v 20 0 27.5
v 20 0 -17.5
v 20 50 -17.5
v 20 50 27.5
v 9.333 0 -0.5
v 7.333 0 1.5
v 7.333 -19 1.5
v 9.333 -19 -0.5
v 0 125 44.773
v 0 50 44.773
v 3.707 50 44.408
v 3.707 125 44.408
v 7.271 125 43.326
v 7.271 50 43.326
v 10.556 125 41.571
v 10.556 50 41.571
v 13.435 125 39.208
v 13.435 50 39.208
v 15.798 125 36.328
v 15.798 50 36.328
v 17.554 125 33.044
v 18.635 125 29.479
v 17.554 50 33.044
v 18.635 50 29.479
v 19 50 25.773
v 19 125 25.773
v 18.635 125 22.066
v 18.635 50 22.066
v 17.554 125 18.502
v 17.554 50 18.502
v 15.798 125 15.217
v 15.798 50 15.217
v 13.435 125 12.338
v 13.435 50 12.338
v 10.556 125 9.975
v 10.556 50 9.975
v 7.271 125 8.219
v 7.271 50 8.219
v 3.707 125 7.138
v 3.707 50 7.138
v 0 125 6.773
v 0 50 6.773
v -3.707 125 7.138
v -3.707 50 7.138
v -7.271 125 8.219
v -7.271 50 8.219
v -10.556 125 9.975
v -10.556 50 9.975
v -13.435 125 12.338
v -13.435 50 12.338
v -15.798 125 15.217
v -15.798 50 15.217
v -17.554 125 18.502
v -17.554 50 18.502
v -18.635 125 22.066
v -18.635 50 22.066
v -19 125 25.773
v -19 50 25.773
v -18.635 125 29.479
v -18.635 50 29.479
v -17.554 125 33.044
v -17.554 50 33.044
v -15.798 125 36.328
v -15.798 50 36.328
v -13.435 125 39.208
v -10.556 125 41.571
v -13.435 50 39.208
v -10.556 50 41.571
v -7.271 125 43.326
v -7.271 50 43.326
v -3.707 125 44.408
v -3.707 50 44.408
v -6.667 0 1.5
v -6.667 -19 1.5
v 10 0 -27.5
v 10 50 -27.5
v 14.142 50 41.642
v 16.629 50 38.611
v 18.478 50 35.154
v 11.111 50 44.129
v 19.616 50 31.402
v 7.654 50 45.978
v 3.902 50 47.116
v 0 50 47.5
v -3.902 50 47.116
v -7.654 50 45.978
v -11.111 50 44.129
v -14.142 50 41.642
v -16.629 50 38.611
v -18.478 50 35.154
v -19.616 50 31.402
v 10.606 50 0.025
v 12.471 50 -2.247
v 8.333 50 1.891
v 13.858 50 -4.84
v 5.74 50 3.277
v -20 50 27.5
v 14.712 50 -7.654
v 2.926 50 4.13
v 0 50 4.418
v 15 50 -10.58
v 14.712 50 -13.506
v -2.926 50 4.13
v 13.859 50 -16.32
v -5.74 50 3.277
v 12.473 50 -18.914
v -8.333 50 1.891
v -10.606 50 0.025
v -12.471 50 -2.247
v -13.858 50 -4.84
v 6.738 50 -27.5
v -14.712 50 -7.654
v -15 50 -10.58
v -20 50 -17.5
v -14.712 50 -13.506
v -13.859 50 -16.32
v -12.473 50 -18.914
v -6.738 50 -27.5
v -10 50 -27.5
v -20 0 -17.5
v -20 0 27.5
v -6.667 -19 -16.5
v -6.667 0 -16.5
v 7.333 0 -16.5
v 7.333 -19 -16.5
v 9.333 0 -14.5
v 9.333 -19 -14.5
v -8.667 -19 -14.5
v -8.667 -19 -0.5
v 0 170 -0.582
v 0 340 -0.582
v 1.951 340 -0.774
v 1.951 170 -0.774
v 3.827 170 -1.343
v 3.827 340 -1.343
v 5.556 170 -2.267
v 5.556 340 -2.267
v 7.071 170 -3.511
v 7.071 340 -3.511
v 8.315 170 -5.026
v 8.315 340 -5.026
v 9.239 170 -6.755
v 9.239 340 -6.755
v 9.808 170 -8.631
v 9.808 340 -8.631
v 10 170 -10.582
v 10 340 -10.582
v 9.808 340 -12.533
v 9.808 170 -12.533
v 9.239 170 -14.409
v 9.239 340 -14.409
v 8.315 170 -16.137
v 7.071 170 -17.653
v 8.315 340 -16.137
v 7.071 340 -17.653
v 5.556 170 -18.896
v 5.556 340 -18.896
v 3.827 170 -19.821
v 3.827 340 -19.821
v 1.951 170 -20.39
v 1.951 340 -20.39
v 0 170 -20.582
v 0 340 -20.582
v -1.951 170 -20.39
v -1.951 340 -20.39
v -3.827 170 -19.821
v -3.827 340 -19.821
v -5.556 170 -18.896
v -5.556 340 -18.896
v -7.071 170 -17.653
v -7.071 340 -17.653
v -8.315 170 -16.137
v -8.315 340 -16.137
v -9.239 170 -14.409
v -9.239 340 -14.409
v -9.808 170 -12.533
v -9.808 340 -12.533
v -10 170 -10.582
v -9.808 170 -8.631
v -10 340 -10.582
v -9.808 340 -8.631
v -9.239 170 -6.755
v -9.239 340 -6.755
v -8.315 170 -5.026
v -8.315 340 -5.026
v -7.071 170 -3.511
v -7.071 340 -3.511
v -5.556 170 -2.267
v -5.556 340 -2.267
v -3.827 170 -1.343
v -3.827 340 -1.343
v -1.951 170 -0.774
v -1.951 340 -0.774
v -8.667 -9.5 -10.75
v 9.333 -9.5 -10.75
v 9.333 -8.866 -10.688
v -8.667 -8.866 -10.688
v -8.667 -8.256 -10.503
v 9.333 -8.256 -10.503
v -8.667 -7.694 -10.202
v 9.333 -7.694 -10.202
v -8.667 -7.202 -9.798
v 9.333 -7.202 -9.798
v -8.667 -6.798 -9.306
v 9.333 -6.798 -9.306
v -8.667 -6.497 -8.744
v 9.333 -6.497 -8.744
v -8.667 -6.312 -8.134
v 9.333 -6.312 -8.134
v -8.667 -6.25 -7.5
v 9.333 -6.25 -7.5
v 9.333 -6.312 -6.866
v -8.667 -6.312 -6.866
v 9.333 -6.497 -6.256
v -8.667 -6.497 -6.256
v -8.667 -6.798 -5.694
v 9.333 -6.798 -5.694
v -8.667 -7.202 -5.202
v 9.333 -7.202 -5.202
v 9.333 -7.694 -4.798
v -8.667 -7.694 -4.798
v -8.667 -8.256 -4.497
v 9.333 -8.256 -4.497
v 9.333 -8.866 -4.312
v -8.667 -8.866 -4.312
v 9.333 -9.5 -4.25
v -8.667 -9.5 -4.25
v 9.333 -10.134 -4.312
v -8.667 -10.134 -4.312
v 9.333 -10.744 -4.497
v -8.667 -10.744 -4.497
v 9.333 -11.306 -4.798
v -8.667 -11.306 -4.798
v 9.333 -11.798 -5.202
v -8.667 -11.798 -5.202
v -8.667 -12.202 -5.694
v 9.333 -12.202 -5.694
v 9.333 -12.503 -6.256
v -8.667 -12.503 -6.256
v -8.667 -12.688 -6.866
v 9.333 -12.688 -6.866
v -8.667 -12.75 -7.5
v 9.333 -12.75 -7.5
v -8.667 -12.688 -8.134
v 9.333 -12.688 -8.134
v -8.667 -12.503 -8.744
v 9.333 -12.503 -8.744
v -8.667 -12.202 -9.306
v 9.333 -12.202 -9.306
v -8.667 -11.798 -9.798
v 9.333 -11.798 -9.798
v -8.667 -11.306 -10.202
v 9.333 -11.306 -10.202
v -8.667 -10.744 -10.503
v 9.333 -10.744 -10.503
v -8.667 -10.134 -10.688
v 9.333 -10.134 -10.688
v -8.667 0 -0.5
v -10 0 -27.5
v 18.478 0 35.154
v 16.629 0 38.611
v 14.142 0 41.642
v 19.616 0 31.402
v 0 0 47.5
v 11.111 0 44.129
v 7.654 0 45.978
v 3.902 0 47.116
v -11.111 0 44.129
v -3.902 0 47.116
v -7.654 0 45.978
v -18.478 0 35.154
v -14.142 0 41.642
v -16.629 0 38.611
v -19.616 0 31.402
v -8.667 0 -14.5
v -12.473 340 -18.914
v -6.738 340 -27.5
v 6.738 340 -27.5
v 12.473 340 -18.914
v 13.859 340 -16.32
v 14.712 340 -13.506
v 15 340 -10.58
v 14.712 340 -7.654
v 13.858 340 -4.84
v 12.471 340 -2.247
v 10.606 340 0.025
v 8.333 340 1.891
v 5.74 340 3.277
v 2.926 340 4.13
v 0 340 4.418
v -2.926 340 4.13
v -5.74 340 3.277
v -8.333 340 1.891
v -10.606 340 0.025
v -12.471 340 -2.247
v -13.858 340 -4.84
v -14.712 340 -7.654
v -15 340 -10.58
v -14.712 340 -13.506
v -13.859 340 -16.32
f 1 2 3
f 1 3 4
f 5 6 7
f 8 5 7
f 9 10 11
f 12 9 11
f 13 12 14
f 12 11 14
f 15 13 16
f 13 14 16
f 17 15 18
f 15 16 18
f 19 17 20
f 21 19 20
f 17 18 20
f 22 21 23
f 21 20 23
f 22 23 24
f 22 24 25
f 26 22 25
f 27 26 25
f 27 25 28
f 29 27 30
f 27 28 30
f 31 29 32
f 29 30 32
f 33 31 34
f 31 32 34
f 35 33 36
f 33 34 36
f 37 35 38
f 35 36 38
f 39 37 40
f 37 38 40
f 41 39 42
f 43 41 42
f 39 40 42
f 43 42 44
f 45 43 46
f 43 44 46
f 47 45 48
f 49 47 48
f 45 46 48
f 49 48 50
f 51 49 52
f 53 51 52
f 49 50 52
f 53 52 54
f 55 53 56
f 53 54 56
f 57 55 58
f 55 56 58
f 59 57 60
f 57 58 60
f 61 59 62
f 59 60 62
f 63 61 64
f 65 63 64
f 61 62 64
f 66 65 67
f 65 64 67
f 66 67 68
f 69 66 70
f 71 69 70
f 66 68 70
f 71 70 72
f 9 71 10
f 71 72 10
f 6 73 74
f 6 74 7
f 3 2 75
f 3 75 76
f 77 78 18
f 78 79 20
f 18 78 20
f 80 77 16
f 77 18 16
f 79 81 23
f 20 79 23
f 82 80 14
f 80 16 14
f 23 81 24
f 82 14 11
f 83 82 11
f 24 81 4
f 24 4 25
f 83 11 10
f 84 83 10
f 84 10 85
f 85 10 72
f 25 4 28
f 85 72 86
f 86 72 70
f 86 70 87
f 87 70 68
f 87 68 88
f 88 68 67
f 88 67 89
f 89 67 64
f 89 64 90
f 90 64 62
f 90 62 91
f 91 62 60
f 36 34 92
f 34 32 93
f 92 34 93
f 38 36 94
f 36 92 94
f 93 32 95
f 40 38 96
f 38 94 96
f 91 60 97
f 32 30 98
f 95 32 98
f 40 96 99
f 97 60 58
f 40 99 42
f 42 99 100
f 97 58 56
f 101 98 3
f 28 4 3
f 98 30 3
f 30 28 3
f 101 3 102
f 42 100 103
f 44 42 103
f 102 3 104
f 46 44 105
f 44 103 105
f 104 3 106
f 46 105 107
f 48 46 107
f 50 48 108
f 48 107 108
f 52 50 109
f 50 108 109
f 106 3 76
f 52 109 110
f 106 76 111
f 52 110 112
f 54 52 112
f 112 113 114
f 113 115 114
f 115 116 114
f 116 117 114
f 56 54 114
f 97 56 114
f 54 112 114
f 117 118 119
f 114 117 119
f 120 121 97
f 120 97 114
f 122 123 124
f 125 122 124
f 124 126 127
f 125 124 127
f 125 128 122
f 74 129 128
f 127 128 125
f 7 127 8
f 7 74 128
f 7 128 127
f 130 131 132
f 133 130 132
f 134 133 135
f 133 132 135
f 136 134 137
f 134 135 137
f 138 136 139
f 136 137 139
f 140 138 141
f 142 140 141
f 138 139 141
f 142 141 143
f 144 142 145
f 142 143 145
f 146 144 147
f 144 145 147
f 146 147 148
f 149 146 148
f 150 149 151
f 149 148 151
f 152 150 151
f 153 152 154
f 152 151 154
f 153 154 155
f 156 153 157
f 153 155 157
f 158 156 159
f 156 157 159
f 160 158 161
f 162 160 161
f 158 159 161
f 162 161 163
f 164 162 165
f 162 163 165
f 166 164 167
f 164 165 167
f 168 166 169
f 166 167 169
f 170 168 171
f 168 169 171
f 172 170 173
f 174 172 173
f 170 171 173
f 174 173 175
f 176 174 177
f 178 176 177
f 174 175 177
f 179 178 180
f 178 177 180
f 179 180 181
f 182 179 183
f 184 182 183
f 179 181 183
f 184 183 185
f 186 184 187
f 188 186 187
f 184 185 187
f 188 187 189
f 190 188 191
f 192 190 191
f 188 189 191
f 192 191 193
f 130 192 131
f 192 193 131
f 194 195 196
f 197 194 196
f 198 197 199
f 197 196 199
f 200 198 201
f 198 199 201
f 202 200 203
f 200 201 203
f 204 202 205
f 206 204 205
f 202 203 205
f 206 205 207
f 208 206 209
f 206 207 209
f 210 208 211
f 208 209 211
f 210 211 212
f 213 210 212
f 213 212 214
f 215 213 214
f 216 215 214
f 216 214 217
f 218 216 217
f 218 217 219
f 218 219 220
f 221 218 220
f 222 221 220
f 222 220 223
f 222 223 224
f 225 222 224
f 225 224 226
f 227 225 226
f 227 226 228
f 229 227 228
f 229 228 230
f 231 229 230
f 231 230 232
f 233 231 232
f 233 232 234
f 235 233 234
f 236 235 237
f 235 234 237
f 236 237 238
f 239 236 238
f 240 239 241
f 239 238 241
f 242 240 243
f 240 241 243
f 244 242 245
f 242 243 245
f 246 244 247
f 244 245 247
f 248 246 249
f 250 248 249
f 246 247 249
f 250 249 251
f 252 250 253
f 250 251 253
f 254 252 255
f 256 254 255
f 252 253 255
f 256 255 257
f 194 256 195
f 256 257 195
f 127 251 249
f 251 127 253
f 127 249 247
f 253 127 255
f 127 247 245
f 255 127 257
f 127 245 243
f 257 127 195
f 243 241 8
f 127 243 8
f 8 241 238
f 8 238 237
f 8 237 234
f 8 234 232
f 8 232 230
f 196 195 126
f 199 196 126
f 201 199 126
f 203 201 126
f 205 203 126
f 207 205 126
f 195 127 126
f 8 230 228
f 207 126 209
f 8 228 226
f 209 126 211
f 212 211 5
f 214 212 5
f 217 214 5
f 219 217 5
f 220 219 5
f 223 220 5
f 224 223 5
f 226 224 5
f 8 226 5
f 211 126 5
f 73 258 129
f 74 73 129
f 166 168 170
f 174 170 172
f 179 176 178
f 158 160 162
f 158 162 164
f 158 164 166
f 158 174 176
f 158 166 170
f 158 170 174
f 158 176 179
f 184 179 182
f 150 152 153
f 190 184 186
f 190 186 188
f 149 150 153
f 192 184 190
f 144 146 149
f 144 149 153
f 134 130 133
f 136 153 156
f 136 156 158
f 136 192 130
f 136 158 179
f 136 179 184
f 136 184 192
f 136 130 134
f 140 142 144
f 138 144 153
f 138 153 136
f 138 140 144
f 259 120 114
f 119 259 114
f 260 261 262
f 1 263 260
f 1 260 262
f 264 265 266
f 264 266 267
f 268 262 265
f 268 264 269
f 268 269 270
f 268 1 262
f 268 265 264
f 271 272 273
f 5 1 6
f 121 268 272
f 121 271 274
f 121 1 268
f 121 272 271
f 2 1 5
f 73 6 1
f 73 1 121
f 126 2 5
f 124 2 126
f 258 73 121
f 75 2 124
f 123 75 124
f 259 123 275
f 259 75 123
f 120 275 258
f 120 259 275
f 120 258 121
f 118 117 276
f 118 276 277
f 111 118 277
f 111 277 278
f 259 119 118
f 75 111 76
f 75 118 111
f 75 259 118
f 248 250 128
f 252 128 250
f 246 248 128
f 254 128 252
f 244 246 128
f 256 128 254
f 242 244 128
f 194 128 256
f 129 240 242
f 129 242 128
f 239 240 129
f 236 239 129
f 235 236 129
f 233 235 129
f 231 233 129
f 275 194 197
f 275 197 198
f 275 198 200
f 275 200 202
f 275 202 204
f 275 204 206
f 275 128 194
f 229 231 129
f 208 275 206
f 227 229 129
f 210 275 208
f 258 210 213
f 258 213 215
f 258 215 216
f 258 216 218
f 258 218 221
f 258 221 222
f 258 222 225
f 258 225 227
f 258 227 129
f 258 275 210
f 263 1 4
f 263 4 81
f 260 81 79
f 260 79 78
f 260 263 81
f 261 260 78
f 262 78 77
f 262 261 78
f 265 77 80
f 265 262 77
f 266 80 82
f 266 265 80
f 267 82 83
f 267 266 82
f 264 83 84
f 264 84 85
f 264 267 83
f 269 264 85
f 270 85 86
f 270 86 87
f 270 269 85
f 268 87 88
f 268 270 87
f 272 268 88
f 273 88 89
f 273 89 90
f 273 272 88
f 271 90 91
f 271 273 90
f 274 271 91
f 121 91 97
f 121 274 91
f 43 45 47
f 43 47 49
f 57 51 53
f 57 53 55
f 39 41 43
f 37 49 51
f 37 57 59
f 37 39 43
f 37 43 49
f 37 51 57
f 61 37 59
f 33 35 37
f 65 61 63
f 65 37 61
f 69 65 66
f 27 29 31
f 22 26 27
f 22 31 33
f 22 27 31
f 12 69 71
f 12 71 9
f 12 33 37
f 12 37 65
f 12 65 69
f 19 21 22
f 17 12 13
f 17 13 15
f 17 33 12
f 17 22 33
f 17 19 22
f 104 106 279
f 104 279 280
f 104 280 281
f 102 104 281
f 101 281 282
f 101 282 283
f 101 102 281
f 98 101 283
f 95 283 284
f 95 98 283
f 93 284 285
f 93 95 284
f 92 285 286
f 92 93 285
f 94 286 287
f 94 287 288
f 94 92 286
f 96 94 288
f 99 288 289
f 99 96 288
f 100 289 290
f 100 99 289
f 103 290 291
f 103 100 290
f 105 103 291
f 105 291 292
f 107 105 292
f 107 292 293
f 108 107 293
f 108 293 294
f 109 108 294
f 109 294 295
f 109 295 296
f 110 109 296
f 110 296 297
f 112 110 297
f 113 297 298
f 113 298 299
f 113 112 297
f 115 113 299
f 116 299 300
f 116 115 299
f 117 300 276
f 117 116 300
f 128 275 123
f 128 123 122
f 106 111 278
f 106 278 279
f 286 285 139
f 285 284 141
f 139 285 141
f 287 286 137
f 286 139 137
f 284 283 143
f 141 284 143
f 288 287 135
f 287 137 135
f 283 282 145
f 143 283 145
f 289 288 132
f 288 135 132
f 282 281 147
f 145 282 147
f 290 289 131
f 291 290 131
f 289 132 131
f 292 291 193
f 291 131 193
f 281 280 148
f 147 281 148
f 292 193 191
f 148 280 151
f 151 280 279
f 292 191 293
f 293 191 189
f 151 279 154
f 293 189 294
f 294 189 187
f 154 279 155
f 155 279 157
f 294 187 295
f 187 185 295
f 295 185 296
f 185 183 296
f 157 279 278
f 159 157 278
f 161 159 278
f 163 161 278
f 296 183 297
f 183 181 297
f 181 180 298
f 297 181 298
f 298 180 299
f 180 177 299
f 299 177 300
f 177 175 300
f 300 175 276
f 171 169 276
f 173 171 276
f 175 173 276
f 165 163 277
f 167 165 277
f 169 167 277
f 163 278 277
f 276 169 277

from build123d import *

# Parameters (mm, degrees)
EXTRUDE_1_DEPTH     = 50
SKETCH_2_R          = 19
EXTRUDE_2_DEPTH     = 75
EXTRUDE_3_DEPTH     = 290
SKETCH_4_R          = 10
CUT_EXTRUDE_1_DEPTH = 170
SKETCH_5_W          = 18
SKETCH_5_H          = 18
EXTRUDE_4_DEPTH     = 19
SKETCH_7_R          = 3.25
CUT_EXTRUDE_2_DEPTH = 19
CHAMFER_1_SIZE      = 10
CHAMFER_2_SIZE      = 2


with BuildPart() as part:
    # 草图1 → 凸台-拉伸1 (new body)
    with BuildSketch(Plane(origin=(0, 0, 0), x_dir=(1, 0, 0), z_dir=(0, 1, 0))):
        with BuildLine():
            Line((-20, 27.5), (20, 27.5))
            Line((20, 27.5), (20, -27.5))
            ThreePointArc((20, -27.5), (0, -47.5), (-20, -27.5))
            Line((-20, -27.5), (-20, 27.5))
        make_face()
    extrude(amount=EXTRUDE_1_DEPTH)

    # 草图2 → 凸台-拉伸2 (add)
    with BuildSketch(Plane(origin=(0, 50, 0), x_dir=(1, 0, 0), z_dir=(0, 1, 0))):
        with Locations(Location((0, -25.772612345, 0), (0, 0, 270))):
            Circle(SKETCH_2_R)
    extrude(amount=EXTRUDE_2_DEPTH)

    # 草图3 → 凸台-拉伸3 (add)
    with BuildSketch(Plane(origin=(0, 50, 0), x_dir=(1, 0, 0), z_dir=(0, 1, 0))):
        with BuildLine():
            Line((-12.473266485, 18.913505227), (-6.7377758, 27.5))
            Line((-6.7377758, 27.5), (6.7377758, 27.5))
            Line((6.7377758, 27.5), (12.473266485, 18.913505227))
            ThreePointArc((12.473266485, 18.913505227), (0, -4.418218675), (-12.473266485, 18.913505227))
        make_face()
    extrude(amount=EXTRUDE_3_DEPTH)

    # 草图4 → 切除-拉伸1 (cut)
    with BuildSketch(Plane(origin=(0, 340, 0), x_dir=(1, 0, 0), z_dir=(0, 1, 0))):
        with Locations(Location((0, 10.581781325, 0), (0, 0, 270))):
            Circle(SKETCH_4_R)
    extrude(amount=-CUT_EXTRUDE_1_DEPTH, mode=Mode.SUBTRACT)

    # 草图5 → 凸台-拉伸4 (add)
    with BuildSketch(Plane.XZ):
        with Locations((0.33262197, -7.5)):
            Rectangle(SKETCH_5_W, SKETCH_5_H)
    extrude(amount=EXTRUDE_4_DEPTH)

    # 草图7 → 切除-拉伸2 (cut)
    with BuildSketch(Plane(origin=(9.33262197, 0, 0), x_dir=(0, 0, -1), z_dir=(1, 0, 0))):
        with Locations((7.5, -9.5)):
            Circle(SKETCH_7_R)
    extrude(amount=-CUT_EXTRUDE_2_DEPTH, mode=Mode.SUBTRACT)

    # 倒角1
    chamfer_1_edges = [part.edges().sort_by_distance(p)[0] for p in [
        (-20, 25, -27.5),
        (20, 25, -27.5),
    ]]
    chamfer(chamfer_1_edges, length=CHAMFER_1_SIZE)

    # 倒角2
    chamfer_2_edges = [part.edges().sort_by_distance(p)[0] for p in [
        (9.33262197, -9.5, -16.5),
        (9.33262197, -9.5, 1.5),
        (-8.66737803, -9.5, 1.5),
        (-8.66737803, -9.5, -16.5),
    ]]
    chamfer(chamfer_2_edges, length=CHAMFER_2_SIZE)


solid = part.part
